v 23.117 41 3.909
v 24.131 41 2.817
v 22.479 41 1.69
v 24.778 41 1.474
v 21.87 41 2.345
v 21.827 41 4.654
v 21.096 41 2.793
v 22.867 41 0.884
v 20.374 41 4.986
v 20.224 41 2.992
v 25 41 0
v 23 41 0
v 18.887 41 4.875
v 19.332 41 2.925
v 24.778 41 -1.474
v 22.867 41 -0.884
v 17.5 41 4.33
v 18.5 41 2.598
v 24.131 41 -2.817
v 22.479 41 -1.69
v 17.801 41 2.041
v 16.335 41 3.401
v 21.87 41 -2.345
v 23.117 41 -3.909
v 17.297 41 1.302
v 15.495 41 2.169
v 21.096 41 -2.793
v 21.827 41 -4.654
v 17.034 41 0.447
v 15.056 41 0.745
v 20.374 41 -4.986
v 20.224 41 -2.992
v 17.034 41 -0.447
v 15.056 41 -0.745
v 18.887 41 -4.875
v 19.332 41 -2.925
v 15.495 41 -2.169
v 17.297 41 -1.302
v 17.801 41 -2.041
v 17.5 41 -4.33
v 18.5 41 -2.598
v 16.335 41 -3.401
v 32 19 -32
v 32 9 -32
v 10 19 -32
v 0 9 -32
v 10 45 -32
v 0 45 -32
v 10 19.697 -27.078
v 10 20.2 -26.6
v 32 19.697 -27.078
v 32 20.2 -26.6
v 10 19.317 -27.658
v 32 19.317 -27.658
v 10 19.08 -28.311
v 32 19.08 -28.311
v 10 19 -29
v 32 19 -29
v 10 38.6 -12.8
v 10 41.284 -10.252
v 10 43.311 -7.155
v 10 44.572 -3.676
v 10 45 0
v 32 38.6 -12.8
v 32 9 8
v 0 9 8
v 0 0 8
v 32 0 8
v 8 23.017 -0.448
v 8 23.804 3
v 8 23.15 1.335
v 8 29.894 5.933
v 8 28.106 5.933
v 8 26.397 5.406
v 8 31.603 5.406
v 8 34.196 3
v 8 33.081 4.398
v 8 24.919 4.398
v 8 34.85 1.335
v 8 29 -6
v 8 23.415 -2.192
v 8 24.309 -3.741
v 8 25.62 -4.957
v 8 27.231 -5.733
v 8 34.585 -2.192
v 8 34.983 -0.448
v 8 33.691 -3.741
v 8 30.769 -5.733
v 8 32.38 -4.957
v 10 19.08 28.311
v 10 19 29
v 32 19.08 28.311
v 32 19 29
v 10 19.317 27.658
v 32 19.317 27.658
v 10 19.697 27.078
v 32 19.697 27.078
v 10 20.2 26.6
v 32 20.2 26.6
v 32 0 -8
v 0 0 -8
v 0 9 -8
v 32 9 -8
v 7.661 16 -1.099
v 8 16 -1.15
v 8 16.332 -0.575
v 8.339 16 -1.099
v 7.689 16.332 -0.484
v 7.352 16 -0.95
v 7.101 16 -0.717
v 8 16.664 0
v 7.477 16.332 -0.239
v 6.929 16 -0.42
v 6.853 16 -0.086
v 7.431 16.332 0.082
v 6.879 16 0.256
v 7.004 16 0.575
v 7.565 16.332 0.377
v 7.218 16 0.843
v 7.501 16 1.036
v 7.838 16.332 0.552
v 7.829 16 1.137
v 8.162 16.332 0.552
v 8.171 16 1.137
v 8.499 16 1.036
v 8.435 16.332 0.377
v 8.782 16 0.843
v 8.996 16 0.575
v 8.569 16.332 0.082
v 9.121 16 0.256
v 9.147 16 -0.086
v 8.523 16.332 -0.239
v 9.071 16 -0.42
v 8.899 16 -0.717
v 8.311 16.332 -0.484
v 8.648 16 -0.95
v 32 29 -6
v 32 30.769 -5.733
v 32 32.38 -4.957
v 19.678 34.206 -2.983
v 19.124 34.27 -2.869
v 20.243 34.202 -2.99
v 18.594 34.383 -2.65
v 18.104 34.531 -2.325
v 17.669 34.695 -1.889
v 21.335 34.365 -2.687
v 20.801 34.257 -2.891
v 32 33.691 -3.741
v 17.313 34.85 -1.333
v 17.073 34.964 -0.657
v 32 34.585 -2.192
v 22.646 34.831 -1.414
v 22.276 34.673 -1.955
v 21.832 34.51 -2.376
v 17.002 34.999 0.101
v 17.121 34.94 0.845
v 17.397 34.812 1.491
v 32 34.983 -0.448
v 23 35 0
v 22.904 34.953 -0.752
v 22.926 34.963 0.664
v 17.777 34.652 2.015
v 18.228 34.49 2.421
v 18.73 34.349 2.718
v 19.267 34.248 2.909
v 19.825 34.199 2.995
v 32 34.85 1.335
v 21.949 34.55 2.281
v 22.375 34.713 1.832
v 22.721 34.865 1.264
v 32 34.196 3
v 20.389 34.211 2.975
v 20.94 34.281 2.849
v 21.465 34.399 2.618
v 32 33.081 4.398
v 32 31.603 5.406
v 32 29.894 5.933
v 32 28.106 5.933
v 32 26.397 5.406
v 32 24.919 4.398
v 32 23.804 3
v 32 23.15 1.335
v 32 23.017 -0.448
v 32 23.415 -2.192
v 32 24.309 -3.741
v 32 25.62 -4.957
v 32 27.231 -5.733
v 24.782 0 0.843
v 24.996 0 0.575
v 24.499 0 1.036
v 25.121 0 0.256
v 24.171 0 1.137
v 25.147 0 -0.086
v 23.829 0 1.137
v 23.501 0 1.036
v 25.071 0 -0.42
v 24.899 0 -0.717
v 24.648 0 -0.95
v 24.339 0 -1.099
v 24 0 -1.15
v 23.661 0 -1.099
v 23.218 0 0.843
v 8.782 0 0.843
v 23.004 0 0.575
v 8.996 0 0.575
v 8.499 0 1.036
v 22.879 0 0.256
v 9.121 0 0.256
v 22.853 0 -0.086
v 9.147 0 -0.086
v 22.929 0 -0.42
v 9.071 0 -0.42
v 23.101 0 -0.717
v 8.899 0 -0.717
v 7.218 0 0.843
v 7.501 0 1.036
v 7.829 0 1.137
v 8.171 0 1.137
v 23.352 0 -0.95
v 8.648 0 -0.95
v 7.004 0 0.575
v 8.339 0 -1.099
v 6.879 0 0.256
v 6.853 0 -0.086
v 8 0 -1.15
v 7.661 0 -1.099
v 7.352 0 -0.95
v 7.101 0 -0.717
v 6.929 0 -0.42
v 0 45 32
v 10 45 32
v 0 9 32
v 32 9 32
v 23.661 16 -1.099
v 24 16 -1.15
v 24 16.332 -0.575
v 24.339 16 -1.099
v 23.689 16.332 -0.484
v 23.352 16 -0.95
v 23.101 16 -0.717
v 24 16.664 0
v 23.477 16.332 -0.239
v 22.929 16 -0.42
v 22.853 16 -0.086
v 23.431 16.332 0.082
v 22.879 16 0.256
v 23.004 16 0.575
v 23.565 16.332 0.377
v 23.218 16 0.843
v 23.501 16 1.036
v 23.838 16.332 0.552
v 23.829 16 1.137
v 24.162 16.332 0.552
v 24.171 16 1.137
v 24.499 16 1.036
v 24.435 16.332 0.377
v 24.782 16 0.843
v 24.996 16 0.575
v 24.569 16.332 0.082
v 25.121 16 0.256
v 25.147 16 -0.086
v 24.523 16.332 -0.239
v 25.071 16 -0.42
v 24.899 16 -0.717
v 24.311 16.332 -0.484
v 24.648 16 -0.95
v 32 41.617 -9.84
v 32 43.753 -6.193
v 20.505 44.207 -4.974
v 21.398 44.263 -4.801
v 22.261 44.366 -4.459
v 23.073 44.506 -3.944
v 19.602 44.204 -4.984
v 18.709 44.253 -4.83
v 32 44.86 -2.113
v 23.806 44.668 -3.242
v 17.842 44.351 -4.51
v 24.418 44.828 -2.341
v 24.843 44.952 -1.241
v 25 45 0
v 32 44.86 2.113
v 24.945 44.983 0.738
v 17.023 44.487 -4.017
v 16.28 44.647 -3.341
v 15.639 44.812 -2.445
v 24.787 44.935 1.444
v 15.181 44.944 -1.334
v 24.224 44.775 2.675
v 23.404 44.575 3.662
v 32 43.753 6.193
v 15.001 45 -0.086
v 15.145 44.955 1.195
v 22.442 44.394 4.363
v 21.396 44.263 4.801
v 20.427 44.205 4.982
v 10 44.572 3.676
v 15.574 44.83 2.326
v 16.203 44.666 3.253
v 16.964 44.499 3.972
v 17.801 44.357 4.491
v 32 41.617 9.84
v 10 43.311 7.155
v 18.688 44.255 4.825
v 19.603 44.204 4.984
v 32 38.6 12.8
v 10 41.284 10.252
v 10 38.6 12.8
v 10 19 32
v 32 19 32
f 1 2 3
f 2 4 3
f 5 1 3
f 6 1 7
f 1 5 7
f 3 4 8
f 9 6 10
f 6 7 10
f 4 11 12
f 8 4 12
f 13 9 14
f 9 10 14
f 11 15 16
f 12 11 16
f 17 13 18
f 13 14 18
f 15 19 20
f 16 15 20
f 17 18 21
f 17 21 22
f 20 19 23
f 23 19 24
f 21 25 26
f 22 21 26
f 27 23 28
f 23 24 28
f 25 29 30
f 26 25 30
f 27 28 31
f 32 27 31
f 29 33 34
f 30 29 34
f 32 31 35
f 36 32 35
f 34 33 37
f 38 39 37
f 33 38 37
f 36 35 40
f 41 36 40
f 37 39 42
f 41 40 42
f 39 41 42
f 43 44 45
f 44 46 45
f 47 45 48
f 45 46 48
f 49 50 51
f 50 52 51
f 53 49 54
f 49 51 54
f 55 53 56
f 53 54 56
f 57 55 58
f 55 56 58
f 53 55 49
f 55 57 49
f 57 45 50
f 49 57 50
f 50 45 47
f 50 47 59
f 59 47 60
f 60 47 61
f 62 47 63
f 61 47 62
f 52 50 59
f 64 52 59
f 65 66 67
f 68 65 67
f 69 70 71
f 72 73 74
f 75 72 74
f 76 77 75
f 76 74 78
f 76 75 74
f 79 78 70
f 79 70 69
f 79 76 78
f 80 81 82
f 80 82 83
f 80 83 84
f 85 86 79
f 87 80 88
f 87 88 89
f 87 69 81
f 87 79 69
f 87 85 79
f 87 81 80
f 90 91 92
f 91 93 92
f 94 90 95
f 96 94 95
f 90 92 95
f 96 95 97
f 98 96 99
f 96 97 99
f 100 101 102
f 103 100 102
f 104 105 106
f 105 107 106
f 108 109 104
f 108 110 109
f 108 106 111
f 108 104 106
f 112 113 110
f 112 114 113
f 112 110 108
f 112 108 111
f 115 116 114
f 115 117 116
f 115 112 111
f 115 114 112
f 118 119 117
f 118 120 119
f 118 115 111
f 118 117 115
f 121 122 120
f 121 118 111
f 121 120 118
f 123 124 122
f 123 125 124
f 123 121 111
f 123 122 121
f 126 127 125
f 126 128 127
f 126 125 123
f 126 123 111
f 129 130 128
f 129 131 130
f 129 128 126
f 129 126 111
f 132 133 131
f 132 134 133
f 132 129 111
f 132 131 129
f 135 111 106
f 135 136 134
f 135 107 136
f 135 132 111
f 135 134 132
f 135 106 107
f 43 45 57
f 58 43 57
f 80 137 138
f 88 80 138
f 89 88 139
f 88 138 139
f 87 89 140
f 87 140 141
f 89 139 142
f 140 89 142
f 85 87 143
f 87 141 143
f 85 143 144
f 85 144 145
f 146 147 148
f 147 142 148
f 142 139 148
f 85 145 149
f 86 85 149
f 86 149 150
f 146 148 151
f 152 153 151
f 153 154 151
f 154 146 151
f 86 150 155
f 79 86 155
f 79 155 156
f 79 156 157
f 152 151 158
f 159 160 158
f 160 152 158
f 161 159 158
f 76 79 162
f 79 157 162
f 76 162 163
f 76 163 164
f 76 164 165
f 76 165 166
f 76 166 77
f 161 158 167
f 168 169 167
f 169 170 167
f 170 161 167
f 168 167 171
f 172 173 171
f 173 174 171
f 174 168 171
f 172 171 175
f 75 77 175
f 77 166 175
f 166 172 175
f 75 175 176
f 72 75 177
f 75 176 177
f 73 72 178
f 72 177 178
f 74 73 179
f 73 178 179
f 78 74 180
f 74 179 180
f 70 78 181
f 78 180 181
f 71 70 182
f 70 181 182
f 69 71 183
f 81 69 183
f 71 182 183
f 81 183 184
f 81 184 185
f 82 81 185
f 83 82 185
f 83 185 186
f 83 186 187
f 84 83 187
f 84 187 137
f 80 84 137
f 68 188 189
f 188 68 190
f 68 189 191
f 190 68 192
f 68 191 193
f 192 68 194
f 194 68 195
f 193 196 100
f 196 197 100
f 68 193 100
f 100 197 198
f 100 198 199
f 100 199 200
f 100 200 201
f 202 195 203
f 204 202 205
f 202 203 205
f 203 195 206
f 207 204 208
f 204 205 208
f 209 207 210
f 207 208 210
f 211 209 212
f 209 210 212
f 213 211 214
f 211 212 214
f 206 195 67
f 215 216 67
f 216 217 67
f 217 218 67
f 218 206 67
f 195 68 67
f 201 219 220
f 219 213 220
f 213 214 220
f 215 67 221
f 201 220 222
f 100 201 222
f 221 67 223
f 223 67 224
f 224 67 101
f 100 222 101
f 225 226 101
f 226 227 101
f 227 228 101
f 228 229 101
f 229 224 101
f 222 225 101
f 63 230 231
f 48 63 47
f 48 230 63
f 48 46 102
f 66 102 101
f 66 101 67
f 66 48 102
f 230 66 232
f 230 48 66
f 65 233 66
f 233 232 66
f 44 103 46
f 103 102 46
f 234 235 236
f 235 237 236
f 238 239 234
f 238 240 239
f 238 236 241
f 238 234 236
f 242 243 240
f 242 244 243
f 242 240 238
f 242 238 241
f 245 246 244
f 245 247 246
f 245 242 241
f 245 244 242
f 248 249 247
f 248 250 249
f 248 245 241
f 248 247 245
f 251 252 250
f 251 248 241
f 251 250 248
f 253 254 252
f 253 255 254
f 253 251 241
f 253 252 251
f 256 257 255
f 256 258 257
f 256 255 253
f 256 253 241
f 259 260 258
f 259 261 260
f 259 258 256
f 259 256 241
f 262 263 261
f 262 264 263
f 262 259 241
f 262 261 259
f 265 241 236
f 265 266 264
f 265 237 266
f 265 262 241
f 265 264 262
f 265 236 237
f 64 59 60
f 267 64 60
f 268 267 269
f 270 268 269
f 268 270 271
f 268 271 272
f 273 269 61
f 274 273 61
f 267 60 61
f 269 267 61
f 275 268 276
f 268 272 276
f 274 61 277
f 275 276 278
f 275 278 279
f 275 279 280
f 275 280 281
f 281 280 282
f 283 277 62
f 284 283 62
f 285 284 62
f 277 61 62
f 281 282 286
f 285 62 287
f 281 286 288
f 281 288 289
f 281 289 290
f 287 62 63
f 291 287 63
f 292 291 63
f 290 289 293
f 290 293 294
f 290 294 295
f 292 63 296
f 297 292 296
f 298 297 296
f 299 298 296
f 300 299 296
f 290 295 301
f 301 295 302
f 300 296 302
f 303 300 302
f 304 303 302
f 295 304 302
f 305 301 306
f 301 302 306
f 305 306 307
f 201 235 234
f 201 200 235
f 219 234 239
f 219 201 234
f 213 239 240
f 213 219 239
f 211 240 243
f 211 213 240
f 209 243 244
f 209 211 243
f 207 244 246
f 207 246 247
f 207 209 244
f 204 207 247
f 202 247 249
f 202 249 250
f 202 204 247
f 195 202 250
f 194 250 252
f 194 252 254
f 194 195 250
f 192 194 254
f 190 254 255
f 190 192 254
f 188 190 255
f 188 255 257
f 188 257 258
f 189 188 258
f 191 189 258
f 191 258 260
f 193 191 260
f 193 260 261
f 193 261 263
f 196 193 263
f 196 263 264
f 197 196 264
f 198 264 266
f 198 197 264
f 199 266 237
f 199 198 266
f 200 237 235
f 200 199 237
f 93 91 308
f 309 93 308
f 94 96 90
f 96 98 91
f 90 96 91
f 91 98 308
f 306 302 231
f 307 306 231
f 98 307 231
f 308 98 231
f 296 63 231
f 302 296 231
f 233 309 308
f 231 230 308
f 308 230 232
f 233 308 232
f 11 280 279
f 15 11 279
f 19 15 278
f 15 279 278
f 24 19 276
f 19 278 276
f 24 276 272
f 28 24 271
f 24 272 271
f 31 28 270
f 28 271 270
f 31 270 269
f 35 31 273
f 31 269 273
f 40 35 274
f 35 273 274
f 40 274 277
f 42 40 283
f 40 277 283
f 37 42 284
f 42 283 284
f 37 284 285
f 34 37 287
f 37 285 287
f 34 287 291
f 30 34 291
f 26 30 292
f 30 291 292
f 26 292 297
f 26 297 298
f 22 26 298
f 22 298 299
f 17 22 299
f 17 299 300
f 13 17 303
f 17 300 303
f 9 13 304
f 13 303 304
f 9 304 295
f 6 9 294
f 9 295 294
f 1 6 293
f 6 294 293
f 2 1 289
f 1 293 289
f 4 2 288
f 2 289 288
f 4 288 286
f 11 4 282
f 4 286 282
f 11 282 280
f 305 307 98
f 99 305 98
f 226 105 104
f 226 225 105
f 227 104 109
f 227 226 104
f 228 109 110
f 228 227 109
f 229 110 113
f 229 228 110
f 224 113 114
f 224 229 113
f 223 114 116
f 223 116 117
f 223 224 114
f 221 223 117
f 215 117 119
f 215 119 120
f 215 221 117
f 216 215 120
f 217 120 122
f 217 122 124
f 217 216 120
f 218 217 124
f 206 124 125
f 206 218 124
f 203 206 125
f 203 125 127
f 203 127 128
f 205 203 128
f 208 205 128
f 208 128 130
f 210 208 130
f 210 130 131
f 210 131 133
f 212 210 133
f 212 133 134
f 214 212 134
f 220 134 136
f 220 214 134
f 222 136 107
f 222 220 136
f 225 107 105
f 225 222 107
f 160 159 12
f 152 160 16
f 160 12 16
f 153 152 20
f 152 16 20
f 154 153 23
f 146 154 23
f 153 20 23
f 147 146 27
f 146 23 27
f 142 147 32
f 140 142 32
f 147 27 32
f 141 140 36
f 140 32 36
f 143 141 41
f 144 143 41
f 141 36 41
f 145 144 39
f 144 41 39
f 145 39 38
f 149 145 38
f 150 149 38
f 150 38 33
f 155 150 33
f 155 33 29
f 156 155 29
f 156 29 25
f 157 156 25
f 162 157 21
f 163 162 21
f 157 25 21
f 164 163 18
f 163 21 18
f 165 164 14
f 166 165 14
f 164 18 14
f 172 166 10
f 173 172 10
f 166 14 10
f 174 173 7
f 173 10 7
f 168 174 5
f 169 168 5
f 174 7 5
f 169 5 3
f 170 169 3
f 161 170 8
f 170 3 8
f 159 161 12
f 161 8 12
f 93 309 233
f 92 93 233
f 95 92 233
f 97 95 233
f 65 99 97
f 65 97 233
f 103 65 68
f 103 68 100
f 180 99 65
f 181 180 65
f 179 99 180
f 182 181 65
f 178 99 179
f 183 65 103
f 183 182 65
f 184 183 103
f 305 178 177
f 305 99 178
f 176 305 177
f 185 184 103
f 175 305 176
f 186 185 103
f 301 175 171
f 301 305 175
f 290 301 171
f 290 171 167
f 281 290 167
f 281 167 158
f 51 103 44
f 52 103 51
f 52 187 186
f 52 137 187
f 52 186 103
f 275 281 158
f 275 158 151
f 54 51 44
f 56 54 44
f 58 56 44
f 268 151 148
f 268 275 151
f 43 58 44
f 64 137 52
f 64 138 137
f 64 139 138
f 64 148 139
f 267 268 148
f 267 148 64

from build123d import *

# Parameters (mm, degrees)
BOSS_EXTRUDE1_DEPTH = 10
BOSS_EXTRUDE2_DEPTH = 22
SKETCH3_R           = 6
CUT_EXTRUDE1_DEPTH  = 24
LPATTERN1_COUNT     = 2
LPATTERN1_PITCH     = 16
FILLET1_R           = 3
FILLET2_R           = 3


# Read off the part's stored shape, not the designer's step: CBORE for M5 Hex Head Bolt1
with BuildPart() as part:
    # Sketch1 → Boss-Extrude1 (new body)
    with BuildSketch(Plane(origin=(0, 0, 0), x_dir=(0, 0, -1), z_dir=(1, 0, 0))):
        Polygon((-32, 45), (32, 45), (32, 9), (8, 9), (8, 0), (-8, 0), (-8, 9), (-32, 9), align=None)
    extrude(amount=BOSS_EXTRUDE1_DEPTH)

    # Sketch2 → Boss-Extrude2 (add)
    with BuildSketch(Plane(origin=(10, 0, 0), x_dir=(0, 0, -1), z_dir=(1, 0, 0))):
        with BuildLine():
            Line((0, 45), (0, 0))
            Line((0, 0), (8, 0))
            Line((8, 0), (8, 9))
            Line((8, 9), (32, 9))
            Line((32, 9), (32, 19))
            Line((32, 19), (27.5, 19))
            Line((27.5, 19), (12.8, 38.6))
            ThreePointArc((12.8, 38.6), (7.155417528, 43.310835056), (0, 45))
        make_face()
        with BuildLine():
            Line((-32, 9), (-8, 9))
            Line((-8, 9), (-8, 0))
            Line((-8, 0), (0, 0))
            Line((0, 0), (0, 45))
            ThreePointArc((0, 45), (-7.155417528, 43.310835056), (-12.8, 38.6))
            Line((-12.8, 38.6), (-27.5, 19))
            Line((-27.5, 19), (-32, 19))
            Line((-32, 19), (-32, 9))
        make_face()
    extrude(amount=BOSS_EXTRUDE2_DEPTH)

    # Sketch3 → Cut-Extrude1 (cut)
    with BuildSketch(Plane(origin=(32, 0, 0), x_dir=(0, 0, -1), z_dir=(1, 0, 0))):
        with Locations((0, 29)):
            Circle(SKETCH3_R)
    extrude(amount=-CUT_EXTRUDE1_DEPTH, mode=Mode.SUBTRACT)

    # CBORE for M5 Hex Head Bolt1 outline → CBORE for M5 Hex Head Bolt1 (revolve, cut)
    with BuildSketch(Plane(origin=(20, 0, 0), x_dir=(1, 0, 0), z_dir=(0, 0, 1))):
        Polygon((0, 34.195854076), (3, 34.195854076), (3, 41), (5, 41), (5, 45.000103319), (0, 45.000103319), align=None)
    revolve(axis=Axis((20, 0, 0), (0, 1, 0)), mode=Mode.SUBTRACT)

    # Sketch7 → Tap Drill for M2.2 Helicoil1 (revolve, cut)
    with BuildSketch(Plane(origin=(24, 0, 0), x_dir=(0, 0, -1), z_dir=(1, 0, 0))):
        Polygon((0, 0), (0, 16.66395281), (1.15, 16), (1.15, 0), align=None)
    tap_drill_for_m2_2_helicoil1 = revolve(axis=Axis((24, -6.35, 0), (0, 1, 0)), mode=Mode.SUBTRACT)

    # LPattern1: Tap Drill for M2.2 Helicoil1 ×2
    with Locations(*[(-i * LPATTERN1_PITCH, 0, 0) for i in range(1, LPATTERN1_COUNT)]):
        add(tap_drill_for_m2_2_helicoil1, mode=Mode.SUBTRACT)

    # Fillet1
    fillet1_edges = [part.edges().sort_by_distance(p)[0] for p in [
        (21, 19, 27.5),
    ]]
    fillet(fillet1_edges, radius=FILLET1_R)

    # Fillet2
    fillet2_edges = [part.edges().sort_by_distance(p)[0] for p in [
        (21, 19, -27.5),
    ]]
    fillet(fillet2_edges, radius=FILLET2_R)


solid = part.part
